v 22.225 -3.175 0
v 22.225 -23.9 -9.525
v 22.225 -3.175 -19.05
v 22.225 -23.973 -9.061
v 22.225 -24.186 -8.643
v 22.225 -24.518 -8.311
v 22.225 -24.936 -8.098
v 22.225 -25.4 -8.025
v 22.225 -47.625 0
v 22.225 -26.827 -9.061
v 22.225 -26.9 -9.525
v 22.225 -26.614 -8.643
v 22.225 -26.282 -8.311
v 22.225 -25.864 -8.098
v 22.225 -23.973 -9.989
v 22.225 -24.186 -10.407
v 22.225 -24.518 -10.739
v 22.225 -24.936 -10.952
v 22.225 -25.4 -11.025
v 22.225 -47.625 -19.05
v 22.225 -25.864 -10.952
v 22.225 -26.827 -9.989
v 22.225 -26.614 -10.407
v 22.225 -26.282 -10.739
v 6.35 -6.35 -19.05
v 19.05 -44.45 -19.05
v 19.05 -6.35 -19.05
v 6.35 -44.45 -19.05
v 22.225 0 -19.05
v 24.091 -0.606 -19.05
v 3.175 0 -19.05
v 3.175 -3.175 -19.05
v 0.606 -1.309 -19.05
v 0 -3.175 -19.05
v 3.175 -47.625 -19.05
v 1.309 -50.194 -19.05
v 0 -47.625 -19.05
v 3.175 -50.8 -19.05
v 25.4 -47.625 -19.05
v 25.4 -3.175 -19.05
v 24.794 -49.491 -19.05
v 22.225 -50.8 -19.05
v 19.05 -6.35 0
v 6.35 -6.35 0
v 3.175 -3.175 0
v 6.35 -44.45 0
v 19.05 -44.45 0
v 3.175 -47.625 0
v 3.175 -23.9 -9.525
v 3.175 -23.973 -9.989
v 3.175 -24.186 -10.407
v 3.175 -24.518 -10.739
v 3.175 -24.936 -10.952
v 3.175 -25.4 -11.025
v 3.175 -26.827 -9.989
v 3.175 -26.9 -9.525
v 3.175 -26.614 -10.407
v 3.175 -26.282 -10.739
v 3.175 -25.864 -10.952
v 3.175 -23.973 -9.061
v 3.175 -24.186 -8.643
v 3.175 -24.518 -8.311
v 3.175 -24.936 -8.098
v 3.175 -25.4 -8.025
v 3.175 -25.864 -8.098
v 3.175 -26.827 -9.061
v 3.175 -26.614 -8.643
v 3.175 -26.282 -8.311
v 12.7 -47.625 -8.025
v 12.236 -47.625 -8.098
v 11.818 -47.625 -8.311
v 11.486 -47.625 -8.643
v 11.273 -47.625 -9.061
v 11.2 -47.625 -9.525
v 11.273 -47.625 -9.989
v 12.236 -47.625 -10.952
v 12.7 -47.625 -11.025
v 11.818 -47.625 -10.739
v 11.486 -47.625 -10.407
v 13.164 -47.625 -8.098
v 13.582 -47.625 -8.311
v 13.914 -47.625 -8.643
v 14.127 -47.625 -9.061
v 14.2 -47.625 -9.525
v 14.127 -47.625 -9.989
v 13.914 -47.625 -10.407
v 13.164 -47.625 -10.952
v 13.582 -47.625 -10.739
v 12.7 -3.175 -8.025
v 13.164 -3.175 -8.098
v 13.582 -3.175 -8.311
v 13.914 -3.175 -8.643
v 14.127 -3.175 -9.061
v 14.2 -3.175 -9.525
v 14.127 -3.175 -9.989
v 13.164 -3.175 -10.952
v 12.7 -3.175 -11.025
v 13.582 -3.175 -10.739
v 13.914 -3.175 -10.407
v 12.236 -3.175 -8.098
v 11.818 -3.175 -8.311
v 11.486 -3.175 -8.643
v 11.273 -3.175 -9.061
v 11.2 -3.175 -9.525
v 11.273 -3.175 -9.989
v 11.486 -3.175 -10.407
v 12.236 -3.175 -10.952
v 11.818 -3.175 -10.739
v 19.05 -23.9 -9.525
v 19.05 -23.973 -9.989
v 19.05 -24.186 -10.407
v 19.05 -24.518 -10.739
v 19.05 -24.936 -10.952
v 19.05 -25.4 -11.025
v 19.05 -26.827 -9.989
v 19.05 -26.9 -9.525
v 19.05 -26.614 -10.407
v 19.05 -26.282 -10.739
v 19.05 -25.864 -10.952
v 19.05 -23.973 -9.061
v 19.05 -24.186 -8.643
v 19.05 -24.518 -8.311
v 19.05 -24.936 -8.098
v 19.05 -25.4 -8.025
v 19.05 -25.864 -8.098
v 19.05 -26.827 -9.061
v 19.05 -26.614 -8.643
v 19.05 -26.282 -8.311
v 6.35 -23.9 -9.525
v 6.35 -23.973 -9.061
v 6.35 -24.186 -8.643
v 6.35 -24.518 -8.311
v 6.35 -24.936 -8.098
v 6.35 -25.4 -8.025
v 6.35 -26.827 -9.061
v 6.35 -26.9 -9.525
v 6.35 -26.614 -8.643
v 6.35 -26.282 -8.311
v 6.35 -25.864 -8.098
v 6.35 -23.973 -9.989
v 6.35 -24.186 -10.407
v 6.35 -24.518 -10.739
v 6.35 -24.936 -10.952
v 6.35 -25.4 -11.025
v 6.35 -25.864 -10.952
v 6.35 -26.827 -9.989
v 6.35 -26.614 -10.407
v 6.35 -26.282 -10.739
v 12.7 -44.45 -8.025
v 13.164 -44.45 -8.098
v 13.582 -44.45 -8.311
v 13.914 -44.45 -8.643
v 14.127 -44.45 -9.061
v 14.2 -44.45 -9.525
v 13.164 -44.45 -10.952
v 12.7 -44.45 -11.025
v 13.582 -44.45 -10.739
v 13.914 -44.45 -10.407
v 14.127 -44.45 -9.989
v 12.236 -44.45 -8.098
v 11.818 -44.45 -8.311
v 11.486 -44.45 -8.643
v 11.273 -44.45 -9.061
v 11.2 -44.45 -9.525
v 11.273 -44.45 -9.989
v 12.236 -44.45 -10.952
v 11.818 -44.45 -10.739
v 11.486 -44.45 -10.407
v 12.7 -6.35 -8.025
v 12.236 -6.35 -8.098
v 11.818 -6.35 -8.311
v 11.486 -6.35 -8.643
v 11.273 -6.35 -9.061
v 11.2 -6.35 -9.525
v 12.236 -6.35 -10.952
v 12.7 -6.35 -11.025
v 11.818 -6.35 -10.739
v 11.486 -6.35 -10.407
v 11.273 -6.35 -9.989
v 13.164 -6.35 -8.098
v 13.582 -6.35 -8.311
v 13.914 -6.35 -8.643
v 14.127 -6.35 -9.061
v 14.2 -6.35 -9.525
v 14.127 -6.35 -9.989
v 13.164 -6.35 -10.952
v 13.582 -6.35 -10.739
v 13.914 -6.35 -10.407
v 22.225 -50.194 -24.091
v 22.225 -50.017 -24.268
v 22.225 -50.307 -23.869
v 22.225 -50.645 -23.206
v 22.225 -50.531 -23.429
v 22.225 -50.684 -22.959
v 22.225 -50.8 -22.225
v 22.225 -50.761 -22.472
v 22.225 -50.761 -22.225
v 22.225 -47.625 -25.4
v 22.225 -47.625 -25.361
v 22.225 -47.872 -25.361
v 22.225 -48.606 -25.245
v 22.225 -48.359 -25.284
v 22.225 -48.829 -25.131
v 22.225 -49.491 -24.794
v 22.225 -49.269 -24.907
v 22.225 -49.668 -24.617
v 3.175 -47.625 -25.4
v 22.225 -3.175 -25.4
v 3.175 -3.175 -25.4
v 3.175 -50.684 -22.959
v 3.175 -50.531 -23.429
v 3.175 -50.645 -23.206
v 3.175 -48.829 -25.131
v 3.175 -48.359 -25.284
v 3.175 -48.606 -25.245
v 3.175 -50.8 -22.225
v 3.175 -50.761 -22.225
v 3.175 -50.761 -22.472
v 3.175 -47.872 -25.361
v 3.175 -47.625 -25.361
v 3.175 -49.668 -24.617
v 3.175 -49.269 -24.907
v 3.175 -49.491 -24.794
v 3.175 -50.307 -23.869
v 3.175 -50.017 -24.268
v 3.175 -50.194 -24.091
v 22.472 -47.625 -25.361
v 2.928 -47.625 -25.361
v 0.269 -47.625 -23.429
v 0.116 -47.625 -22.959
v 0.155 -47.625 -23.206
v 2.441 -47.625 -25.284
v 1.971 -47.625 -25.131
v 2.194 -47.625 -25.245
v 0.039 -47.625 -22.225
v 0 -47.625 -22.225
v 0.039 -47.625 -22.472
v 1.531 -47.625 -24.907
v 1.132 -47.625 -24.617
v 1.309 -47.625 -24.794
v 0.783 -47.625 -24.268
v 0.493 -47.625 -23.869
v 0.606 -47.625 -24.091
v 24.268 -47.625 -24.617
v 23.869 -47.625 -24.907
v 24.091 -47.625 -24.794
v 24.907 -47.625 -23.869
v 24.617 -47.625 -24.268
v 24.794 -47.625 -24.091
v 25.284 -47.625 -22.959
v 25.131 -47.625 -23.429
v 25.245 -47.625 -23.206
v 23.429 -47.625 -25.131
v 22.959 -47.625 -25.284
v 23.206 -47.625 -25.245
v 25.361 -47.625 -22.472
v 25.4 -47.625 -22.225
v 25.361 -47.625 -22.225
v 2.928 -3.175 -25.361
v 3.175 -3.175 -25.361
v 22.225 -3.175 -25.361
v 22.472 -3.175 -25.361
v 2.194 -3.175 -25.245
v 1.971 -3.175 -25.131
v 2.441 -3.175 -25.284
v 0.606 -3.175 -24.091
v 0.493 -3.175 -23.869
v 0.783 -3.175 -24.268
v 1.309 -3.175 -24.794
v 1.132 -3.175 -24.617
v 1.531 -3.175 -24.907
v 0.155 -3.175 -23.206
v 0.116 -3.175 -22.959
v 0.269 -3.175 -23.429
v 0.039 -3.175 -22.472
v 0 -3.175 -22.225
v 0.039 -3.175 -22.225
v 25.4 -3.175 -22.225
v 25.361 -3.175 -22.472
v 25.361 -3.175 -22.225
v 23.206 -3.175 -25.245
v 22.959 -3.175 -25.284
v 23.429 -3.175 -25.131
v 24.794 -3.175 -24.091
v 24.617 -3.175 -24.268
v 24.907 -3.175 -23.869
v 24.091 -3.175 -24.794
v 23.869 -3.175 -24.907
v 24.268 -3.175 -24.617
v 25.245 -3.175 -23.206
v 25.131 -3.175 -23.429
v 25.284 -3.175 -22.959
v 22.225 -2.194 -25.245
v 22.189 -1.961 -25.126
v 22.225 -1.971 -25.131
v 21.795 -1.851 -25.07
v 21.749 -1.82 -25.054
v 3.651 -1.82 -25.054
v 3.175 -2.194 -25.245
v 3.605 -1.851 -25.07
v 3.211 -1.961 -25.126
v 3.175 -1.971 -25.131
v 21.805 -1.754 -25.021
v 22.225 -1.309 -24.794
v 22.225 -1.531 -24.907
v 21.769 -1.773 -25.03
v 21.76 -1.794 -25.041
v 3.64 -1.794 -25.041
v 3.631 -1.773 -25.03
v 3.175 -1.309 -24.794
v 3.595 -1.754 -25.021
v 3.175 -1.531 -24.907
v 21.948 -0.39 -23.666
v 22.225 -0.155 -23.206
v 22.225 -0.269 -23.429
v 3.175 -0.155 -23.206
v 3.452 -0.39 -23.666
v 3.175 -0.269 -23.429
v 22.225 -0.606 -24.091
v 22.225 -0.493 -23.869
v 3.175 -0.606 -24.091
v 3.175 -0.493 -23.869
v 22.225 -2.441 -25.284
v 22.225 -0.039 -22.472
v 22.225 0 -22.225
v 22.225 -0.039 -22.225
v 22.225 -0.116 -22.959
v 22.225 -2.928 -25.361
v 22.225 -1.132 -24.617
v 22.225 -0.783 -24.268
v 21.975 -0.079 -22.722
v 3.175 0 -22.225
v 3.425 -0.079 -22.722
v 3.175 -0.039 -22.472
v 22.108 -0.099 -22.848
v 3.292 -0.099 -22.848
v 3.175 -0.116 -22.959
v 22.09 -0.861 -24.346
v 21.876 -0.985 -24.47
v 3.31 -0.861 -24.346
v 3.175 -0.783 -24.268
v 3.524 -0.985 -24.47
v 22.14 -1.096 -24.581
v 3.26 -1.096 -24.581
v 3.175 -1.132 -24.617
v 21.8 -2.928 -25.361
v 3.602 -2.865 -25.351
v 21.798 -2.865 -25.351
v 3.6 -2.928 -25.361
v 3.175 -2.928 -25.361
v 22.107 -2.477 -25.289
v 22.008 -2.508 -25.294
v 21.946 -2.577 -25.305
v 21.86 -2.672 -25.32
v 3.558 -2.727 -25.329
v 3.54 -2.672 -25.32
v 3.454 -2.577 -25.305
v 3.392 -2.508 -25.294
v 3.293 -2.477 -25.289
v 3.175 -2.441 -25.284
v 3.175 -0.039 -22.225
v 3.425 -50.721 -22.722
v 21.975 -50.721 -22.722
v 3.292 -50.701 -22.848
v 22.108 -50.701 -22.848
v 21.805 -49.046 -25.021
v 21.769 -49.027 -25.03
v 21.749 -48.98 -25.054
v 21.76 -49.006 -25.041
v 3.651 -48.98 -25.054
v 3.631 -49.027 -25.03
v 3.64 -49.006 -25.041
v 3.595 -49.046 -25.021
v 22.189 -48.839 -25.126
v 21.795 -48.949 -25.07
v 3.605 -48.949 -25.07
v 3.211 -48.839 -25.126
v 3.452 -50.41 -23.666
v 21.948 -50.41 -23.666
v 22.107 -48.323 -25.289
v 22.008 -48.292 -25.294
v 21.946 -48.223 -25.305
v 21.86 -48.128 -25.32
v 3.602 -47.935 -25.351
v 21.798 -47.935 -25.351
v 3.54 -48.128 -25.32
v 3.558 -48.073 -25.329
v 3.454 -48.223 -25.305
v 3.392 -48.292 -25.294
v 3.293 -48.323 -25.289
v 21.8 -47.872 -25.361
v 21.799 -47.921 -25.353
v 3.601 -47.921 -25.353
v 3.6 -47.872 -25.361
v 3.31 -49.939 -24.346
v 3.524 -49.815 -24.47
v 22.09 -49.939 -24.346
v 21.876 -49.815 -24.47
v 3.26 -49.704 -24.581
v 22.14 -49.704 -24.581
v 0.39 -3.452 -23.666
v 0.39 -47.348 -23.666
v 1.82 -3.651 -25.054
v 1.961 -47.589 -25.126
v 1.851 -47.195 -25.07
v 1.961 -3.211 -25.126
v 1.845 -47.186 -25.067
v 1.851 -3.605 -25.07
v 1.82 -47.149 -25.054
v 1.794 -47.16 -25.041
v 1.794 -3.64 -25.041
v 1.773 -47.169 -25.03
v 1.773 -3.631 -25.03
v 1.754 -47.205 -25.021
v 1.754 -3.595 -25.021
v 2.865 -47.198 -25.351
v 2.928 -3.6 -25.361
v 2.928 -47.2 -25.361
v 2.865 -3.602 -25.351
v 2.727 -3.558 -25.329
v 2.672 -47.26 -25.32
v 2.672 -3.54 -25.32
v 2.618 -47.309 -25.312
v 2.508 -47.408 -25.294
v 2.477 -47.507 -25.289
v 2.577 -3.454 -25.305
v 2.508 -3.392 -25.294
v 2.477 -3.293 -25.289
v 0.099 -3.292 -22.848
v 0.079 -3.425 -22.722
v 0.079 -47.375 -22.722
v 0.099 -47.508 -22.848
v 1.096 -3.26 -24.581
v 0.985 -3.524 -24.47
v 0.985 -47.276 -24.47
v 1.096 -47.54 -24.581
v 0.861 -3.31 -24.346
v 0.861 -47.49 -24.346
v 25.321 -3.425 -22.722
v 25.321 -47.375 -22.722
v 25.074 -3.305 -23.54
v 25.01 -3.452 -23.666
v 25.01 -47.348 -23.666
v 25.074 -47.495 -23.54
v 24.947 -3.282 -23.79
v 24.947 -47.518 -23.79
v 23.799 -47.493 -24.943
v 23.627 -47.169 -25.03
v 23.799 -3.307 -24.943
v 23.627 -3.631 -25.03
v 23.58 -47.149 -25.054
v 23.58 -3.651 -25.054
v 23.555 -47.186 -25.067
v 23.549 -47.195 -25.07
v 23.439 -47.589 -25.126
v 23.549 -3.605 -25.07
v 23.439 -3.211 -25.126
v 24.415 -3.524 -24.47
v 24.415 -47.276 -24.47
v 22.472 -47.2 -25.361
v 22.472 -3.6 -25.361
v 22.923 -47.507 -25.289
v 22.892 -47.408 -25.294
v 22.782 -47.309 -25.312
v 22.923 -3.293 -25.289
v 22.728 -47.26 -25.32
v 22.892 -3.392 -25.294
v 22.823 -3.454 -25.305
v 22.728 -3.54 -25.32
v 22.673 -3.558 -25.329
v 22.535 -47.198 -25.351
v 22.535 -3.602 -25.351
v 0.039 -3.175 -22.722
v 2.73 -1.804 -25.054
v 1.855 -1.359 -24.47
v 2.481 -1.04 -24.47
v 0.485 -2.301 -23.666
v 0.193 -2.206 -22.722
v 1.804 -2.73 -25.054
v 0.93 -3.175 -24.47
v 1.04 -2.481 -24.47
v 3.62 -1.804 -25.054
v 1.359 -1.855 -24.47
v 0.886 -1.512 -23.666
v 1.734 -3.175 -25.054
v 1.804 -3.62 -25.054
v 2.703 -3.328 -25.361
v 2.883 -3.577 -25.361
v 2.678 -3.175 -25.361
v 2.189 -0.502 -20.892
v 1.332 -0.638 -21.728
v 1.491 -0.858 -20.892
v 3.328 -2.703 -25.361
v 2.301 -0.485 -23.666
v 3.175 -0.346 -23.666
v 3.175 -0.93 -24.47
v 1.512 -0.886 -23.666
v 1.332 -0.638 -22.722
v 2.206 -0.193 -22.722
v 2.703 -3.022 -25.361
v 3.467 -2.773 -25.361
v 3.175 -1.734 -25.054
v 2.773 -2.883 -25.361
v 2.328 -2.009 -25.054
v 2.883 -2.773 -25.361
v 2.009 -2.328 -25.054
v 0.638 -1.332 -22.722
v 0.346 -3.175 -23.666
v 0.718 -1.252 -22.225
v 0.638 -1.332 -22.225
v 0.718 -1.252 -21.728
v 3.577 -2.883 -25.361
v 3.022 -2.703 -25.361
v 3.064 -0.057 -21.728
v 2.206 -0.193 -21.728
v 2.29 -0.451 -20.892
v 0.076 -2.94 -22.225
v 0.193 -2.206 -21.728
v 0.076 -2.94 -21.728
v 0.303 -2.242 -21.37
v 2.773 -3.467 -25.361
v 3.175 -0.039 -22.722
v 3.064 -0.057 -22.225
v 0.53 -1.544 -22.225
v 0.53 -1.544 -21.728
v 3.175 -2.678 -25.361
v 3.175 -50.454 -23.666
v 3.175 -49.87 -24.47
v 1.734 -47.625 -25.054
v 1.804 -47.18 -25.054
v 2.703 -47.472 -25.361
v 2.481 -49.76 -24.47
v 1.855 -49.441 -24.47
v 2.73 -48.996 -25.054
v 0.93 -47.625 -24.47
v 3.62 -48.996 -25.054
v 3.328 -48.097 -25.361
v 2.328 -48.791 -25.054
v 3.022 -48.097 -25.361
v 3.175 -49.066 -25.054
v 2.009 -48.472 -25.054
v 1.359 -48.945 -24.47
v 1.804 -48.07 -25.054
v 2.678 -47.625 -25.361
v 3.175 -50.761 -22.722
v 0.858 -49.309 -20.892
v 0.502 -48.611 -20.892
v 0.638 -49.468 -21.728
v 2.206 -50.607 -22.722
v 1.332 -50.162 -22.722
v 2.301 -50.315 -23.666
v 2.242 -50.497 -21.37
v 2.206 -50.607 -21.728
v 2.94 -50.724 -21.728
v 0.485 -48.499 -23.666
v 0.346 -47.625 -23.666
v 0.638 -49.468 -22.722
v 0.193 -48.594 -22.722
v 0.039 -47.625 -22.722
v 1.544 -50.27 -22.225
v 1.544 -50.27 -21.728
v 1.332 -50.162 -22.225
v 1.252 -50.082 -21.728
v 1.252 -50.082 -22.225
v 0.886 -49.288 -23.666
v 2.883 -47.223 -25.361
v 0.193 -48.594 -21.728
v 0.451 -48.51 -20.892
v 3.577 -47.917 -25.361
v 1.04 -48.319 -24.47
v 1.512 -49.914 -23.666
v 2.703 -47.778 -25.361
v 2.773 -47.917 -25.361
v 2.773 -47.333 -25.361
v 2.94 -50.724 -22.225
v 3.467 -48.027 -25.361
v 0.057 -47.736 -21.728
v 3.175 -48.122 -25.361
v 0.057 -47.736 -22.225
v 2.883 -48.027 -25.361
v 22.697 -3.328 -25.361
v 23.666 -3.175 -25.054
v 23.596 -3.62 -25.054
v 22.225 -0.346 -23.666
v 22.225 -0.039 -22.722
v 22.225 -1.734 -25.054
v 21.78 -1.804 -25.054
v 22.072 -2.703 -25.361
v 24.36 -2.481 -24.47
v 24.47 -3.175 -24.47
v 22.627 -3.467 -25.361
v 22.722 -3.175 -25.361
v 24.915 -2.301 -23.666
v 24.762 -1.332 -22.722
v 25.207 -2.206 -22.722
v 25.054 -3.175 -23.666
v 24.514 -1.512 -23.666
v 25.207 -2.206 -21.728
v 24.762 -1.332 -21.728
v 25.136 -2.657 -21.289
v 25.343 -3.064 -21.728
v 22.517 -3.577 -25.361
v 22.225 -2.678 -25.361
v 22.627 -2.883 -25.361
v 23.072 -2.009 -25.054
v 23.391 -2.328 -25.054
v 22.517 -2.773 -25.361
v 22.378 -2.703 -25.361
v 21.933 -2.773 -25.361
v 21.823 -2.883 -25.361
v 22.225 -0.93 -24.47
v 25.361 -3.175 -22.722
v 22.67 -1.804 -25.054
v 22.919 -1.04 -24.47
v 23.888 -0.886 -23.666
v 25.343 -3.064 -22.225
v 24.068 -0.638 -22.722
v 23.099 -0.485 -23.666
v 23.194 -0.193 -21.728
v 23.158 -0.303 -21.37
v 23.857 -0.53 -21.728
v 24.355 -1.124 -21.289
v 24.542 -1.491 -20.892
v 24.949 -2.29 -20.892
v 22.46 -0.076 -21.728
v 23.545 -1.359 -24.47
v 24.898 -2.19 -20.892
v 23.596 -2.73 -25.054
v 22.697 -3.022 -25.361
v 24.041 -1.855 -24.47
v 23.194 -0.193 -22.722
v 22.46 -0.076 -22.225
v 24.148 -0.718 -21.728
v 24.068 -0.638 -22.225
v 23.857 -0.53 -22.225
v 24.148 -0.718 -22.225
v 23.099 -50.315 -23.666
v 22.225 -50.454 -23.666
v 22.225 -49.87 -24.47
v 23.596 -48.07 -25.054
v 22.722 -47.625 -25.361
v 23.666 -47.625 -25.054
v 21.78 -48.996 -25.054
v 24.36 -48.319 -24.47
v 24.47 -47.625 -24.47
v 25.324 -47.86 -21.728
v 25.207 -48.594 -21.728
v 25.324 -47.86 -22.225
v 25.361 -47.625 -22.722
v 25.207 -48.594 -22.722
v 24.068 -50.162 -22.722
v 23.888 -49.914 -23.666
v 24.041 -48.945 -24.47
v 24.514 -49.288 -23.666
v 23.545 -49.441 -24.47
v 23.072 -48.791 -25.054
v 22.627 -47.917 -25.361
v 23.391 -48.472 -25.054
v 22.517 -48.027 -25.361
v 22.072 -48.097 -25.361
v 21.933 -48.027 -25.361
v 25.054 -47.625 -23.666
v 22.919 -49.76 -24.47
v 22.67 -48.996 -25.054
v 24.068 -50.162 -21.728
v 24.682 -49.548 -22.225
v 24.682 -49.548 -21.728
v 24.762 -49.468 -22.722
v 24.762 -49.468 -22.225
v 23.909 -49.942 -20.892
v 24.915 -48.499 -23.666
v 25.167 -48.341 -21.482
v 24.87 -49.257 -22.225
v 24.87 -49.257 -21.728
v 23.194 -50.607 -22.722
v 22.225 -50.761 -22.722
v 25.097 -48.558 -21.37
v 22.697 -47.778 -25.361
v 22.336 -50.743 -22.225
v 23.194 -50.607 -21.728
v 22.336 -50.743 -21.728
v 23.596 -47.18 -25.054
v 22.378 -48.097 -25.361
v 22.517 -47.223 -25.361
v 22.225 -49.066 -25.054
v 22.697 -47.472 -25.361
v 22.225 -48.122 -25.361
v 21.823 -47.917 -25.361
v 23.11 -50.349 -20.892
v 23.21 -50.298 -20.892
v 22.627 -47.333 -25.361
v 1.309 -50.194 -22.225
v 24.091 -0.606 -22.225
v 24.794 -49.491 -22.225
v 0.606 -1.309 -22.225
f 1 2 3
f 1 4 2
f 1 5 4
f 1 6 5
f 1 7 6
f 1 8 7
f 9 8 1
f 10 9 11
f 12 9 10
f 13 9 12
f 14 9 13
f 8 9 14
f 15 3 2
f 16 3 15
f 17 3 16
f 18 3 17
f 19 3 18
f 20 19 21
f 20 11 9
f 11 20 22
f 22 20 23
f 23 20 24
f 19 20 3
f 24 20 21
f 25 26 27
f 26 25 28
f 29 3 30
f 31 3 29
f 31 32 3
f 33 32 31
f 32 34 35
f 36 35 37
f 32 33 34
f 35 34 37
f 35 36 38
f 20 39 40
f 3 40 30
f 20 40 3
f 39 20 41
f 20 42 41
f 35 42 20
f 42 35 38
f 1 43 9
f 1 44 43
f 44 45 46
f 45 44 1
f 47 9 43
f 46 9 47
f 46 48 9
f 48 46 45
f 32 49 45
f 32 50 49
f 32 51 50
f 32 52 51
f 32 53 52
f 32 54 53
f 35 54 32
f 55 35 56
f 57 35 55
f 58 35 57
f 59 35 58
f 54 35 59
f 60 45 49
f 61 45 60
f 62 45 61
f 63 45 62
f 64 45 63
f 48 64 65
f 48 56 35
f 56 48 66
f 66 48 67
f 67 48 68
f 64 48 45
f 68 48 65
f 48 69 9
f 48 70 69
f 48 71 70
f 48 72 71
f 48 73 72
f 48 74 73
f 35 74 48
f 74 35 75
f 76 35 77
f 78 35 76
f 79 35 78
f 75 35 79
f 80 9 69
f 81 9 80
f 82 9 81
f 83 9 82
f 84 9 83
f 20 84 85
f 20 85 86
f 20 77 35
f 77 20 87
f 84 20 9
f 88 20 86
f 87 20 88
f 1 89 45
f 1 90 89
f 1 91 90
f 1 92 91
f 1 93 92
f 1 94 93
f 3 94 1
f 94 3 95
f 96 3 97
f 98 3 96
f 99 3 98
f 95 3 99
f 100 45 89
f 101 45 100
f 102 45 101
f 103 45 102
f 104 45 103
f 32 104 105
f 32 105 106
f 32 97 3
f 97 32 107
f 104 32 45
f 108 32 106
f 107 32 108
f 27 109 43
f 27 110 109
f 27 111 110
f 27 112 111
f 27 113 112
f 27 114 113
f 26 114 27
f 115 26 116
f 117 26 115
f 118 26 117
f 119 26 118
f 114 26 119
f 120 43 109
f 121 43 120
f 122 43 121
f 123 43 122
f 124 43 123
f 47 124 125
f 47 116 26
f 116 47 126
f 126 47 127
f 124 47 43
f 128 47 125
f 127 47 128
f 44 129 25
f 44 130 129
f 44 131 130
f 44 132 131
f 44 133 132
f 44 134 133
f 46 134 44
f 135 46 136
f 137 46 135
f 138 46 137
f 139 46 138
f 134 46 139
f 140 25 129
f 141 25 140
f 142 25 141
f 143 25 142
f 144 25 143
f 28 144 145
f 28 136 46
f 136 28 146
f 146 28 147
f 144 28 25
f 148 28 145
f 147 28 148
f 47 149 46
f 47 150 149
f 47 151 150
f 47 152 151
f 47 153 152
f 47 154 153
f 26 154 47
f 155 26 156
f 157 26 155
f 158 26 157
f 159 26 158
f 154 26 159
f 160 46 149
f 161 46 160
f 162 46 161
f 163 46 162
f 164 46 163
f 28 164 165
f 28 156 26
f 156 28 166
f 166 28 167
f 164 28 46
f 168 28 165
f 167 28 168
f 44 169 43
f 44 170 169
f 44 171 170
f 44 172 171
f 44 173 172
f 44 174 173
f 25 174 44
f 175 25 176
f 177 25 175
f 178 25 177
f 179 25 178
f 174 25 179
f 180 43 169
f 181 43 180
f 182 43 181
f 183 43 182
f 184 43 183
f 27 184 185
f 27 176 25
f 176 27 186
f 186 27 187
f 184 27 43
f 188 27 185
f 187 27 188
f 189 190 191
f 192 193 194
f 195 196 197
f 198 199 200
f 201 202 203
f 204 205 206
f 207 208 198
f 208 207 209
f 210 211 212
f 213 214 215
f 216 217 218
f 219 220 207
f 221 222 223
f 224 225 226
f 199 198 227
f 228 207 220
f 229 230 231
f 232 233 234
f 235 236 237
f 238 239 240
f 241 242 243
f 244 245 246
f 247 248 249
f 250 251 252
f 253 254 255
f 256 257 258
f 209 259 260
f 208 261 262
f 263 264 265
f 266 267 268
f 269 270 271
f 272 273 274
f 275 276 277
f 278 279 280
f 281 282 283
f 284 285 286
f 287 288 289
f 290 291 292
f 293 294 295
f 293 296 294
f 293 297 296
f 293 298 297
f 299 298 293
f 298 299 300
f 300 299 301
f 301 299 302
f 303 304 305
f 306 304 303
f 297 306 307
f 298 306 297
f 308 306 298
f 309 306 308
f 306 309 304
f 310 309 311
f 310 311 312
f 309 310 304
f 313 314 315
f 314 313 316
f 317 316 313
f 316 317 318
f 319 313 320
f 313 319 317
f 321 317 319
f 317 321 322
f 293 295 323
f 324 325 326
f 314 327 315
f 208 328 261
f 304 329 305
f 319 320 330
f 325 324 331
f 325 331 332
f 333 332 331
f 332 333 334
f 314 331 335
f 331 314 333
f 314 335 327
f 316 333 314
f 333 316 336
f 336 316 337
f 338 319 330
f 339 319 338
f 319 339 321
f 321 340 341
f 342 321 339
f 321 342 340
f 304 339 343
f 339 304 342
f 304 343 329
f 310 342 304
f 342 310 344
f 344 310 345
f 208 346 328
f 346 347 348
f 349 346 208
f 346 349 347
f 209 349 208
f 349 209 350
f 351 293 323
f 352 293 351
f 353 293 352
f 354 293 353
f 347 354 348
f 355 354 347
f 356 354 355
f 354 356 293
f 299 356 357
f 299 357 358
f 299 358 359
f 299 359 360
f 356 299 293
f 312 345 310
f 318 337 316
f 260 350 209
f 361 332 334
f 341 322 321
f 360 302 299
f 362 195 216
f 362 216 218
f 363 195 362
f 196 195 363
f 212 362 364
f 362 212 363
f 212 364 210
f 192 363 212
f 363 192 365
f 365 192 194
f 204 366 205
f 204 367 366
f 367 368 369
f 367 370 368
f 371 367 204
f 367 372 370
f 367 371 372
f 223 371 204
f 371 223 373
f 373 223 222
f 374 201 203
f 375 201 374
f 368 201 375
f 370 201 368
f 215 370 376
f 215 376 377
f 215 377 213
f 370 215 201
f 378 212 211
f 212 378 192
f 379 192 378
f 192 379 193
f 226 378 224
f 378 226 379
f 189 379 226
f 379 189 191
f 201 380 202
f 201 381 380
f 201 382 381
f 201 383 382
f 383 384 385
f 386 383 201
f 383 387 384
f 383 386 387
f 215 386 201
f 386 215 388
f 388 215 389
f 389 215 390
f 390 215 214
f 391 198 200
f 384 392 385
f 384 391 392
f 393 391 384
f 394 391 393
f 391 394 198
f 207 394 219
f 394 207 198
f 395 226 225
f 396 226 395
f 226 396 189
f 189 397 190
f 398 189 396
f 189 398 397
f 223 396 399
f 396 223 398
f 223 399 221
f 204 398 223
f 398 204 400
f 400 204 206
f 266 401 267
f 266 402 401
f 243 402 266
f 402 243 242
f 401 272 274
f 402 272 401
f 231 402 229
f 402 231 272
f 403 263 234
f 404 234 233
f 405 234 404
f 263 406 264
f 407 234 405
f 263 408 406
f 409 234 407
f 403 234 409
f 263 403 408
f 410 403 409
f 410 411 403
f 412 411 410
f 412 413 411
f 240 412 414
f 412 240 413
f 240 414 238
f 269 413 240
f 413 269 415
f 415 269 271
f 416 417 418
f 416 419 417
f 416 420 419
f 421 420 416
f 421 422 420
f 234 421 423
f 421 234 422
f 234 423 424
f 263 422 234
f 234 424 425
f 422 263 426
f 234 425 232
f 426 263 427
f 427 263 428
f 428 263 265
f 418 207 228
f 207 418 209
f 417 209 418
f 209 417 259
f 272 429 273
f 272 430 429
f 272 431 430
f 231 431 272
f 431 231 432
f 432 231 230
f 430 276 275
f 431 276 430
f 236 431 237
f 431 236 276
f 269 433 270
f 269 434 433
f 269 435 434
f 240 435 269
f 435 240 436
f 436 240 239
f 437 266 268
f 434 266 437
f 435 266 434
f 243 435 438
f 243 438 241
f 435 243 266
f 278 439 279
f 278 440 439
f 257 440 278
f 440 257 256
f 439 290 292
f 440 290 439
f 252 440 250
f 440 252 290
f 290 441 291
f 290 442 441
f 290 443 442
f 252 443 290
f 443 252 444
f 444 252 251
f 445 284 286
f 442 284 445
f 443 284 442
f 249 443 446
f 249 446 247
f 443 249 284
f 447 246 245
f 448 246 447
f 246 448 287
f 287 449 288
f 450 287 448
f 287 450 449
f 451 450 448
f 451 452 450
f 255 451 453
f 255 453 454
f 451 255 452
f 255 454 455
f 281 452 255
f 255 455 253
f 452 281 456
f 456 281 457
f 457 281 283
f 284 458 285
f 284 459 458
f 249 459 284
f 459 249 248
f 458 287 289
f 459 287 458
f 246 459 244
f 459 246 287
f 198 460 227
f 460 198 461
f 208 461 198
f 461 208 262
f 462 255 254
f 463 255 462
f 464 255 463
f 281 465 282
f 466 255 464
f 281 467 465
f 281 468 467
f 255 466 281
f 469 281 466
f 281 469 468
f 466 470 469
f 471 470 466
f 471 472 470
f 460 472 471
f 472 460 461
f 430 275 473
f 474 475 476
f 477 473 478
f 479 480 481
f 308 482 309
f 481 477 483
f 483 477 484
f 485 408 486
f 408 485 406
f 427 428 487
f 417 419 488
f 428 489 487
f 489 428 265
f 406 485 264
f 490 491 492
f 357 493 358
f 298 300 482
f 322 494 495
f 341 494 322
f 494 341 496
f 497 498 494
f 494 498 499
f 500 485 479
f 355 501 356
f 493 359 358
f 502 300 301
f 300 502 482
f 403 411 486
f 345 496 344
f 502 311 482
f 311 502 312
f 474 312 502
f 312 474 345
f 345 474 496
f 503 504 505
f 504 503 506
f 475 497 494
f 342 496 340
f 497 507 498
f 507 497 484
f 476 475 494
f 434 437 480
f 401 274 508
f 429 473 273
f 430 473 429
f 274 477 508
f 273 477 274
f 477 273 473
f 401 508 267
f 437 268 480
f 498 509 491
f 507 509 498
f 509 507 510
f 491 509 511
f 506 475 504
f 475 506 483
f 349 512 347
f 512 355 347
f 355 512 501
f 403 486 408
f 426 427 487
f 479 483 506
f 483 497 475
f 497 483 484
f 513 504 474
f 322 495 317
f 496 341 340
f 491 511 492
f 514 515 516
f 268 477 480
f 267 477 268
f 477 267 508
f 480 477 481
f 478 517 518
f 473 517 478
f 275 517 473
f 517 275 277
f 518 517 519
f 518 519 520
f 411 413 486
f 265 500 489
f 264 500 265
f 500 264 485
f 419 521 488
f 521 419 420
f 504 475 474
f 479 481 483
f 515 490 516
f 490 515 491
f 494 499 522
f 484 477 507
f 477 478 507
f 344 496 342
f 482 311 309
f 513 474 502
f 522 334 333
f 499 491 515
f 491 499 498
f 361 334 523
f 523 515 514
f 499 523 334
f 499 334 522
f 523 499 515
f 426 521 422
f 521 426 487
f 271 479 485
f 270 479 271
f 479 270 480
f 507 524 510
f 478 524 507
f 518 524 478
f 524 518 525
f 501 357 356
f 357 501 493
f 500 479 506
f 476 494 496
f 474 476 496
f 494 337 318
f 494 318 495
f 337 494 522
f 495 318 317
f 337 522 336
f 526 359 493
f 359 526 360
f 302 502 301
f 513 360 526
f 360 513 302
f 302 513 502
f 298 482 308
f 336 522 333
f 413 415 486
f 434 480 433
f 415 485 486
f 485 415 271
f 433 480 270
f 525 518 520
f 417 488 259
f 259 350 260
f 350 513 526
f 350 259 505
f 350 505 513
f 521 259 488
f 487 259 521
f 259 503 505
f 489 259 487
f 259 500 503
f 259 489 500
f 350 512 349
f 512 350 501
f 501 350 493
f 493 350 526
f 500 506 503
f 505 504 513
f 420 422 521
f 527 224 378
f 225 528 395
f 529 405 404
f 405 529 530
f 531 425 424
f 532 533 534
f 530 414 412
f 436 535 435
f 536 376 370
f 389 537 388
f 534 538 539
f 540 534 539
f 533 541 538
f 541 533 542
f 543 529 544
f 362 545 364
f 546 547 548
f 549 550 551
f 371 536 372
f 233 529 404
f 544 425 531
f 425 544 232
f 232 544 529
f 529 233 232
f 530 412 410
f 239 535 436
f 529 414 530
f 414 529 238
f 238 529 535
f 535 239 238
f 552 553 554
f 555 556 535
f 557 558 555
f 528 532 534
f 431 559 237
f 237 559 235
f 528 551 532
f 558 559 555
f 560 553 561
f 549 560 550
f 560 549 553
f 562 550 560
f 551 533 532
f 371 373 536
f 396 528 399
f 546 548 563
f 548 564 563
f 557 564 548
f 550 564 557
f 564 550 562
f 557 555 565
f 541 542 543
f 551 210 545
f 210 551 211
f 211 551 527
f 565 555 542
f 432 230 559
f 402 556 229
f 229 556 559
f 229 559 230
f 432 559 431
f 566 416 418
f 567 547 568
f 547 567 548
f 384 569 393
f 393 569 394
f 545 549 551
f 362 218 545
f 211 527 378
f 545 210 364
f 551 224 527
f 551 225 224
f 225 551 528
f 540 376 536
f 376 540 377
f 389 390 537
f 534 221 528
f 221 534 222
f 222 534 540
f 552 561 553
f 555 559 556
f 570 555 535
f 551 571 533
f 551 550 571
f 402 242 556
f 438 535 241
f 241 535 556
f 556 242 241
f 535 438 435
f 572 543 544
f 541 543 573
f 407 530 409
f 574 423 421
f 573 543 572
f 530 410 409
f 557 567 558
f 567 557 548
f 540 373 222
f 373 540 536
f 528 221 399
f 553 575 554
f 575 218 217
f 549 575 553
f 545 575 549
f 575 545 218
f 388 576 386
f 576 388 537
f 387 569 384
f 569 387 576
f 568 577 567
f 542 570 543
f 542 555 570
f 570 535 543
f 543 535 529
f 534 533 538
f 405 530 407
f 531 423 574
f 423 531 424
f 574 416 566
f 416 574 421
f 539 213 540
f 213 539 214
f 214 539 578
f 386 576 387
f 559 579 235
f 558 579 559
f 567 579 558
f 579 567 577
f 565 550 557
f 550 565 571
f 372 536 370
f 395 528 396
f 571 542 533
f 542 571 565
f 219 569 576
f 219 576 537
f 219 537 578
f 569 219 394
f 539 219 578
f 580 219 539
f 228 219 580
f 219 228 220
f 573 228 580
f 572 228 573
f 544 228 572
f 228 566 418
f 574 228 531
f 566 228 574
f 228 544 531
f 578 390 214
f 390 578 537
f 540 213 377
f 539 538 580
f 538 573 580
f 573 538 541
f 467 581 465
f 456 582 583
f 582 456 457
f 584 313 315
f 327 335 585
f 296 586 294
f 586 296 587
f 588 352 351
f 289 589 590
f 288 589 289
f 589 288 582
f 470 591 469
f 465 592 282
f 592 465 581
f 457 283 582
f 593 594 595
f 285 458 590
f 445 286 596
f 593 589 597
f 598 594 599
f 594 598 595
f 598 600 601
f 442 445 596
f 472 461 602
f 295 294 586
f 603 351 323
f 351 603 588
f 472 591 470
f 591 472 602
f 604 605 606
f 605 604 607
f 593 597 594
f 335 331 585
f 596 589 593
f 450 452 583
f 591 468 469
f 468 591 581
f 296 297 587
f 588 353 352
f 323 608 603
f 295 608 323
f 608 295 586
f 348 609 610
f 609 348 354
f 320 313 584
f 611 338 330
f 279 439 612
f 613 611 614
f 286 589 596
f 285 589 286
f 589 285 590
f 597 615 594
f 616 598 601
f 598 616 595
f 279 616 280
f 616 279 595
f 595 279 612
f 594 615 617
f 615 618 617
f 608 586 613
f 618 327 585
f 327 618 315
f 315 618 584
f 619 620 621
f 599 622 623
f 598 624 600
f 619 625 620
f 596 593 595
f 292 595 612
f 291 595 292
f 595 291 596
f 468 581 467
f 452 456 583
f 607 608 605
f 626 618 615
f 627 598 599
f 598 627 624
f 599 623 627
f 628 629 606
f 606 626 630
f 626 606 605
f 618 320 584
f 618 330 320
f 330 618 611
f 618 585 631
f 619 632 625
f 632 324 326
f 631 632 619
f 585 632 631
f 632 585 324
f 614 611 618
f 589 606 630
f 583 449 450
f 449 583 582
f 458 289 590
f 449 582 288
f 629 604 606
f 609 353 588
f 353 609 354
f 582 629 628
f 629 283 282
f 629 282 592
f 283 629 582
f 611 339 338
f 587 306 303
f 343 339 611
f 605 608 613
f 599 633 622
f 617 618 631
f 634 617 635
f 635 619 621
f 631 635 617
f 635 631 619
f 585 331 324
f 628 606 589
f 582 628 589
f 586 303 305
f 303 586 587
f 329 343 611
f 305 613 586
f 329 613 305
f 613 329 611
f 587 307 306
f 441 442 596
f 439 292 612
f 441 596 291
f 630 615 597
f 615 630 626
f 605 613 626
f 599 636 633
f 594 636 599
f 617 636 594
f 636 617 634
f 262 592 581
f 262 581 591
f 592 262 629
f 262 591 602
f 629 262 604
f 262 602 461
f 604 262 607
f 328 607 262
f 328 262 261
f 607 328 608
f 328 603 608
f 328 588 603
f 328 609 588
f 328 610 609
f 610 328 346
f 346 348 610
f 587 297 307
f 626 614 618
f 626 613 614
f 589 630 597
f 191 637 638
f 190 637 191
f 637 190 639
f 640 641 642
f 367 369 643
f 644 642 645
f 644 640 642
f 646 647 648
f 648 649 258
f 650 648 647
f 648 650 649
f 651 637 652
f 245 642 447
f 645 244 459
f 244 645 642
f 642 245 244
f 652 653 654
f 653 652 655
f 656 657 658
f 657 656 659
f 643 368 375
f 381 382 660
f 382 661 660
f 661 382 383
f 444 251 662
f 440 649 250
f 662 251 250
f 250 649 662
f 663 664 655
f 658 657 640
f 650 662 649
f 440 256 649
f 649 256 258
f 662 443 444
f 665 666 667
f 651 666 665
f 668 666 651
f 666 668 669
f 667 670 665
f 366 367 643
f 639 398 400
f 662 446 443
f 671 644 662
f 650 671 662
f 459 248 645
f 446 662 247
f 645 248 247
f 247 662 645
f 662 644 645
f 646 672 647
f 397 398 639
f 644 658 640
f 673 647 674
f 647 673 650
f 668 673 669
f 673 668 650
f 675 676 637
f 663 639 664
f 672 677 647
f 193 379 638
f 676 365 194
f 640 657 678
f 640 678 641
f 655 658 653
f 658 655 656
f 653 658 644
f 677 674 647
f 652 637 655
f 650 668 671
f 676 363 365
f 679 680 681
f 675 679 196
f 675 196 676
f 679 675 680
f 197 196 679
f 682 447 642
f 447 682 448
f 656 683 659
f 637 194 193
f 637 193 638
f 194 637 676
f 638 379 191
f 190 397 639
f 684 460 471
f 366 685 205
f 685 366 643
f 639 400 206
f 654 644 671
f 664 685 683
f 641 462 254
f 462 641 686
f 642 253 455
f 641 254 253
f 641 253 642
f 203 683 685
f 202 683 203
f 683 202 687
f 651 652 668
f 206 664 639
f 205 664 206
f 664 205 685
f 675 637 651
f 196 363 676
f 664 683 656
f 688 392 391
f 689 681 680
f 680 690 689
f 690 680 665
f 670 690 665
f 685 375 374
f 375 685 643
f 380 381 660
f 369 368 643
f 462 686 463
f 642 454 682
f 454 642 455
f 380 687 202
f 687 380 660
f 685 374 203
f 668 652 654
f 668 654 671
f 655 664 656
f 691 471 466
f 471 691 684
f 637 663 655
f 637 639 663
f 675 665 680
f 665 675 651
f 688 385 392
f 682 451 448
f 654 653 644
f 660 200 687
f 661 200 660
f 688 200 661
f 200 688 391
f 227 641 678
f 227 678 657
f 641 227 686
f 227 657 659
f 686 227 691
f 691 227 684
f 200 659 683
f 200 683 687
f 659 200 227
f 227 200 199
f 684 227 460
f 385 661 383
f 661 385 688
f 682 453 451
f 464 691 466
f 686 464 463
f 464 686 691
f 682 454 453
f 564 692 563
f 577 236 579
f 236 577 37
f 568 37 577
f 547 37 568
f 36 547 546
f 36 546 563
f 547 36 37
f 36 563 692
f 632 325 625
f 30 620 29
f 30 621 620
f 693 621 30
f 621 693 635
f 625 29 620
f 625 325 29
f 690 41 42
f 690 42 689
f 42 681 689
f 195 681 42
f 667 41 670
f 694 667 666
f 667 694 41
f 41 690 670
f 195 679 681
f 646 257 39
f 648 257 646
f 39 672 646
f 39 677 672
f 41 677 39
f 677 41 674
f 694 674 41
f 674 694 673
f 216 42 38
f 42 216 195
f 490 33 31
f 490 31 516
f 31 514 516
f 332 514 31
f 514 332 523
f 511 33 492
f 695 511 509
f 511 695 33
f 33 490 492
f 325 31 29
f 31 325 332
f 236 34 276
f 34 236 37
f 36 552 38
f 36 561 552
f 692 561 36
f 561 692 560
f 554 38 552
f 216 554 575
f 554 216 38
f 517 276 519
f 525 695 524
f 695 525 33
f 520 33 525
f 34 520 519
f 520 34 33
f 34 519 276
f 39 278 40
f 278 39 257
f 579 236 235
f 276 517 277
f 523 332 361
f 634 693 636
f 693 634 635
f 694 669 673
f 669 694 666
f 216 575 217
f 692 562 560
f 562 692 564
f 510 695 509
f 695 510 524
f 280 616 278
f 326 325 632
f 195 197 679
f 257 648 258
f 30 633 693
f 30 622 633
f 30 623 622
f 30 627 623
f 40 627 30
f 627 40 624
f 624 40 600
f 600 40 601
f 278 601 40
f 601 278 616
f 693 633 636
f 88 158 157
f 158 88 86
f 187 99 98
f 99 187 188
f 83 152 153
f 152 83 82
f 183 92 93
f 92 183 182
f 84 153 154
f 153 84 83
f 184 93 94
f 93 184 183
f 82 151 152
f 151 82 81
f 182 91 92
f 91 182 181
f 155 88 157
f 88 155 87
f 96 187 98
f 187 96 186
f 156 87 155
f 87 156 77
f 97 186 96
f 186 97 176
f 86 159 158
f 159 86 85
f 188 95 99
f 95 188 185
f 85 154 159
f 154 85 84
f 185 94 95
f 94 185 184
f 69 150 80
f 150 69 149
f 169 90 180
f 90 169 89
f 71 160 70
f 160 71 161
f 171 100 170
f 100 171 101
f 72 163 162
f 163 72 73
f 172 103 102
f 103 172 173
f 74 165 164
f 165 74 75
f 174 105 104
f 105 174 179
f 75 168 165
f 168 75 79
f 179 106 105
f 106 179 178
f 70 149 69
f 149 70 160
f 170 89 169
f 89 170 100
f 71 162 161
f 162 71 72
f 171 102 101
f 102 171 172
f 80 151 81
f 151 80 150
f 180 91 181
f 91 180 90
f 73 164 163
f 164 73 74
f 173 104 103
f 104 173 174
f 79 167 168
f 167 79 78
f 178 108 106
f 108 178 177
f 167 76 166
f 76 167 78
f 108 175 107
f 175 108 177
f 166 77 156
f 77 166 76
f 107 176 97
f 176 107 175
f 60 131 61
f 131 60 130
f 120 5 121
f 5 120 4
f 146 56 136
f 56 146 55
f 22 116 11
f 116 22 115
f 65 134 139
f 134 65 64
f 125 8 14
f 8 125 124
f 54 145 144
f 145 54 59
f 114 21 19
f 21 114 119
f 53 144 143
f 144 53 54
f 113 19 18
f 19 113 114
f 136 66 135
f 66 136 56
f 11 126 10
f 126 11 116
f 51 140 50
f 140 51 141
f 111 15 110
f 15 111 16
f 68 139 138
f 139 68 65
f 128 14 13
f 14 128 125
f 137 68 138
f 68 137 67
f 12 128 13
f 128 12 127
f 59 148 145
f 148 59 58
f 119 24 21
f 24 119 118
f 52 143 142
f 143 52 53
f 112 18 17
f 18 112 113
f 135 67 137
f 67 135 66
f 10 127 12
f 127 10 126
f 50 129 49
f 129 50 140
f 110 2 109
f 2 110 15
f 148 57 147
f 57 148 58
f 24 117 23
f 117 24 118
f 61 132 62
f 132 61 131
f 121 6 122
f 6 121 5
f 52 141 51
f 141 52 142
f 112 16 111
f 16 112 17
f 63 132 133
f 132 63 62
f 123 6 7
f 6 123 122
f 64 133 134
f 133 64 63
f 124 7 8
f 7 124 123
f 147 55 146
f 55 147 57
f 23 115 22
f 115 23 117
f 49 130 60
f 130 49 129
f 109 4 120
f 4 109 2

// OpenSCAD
in=25.4;

module roundedRect(size, radius) {
x = size[0];
y = size[1];
z = size[2];

linear_extrude(height=z)
	hull() {
		// place 4 circles in the corners, with the given radius
		translate([(-x/2)+(radius/2), (-y/2)+(radius/2), 0])
		circle(r=radius);
	
		translate([(x/2)-(radius/2), (-y/2)+(radius/2), 0])
		circle(r=radius);
	
		translate([(-x/2)+(radius/2), (y/2)-(radius/2), 0])
		circle(r=radius);
	
		translate([(x/2)-(radius/2), (y/2)-(radius/2), 0])
		circle(r=radius);
	}
}


module rounded_cube(sx,sy,sz,r) 
{
	$fn=20;
	union()
	{
		translate([r,r,0]) cube([sx-2*r,sy-2*r,sz],false);
		translate([r,0,r]) cube([sx-2*r,sy,sz-2*r],false);
		translate([0,r,r]) cube([sx,sy-2*r,sz-2*r],false);

		translate([r,r,r]) rotate(a=[0,90,0]) cylinder(h=sx-2*r,r=r,center=false);
		translate([r,sy-r,r]) rotate(a=[0,90,0]) cylinder(h=sx-2*r,r=r,center=false);
		translate([r,r,sz-r]) rotate(a=[0,90,0]) cylinder(h=sx-2*r,r=r,center=false);
		translate([r,sy-r,sz-r]) rotate(a=[0,90,0]) cylinder(h=sx-2*r,r=r,center=false);

		translate([r,r,r]) rotate(a=[0,0,0]) cylinder(h=sz-2*r,r=r,center=false);
		translate([r,sy-r,r]) rotate(a=[0,0,0]) cylinder(h=sz-2*r,r=r,center=false);
		translate([sx-r,r,r]) rotate(a=[0,0,0]) cylinder(h=sz-2*r,r=r,center=false);
		translate([sx-r,sy-r,r]) rotate(a=[0,0,0]) cylinder(h=sz-2*r,r=r,center=false);

		translate([r,r,r]) rotate(a=[-90,0,0]) cylinder(h=sy-2*r,r=r,center=false);
		translate([r,r,sz-r]) rotate(a=[-90,0,0]) cylinder(h=sy-2*r,r=r,center=false);
		translate([sx-r,r,r]) rotate(a=[-90,0,0]) cylinder(h=sy-2*r,r=r,center=false);
		translate([sx-r,r,sz-r]) rotate(a=[-90,0,0]) cylinder(h=sy-2*r,r=r,center=false);

		translate([r,r,r]) sphere(r);
		translate([r,sy-r,r]) sphere(r);
		translate([r,r,sz-r]) sphere(r);
		translate([r,sy-r,sz-r]) sphere(r);

		translate([sx-r,r,r]) sphere(r);
		translate([sx-r,sy-r,r]) sphere(r);
		translate([sx-r,r,sz-r]) sphere(r);
		translate([sx-r,sy-r,sz-r]) sphere(r);
	}
}



module endCap(w=1*in, l=1*in, ih=in/2, wall=in/16, oh=in/4) {
	offset=wall;
	hole=3;		//mount hole diameter

	rotate([180, 0,0])
		difference() {
			union() {
				difference() {
					translate([wall,wall,0]) cube([w-wall*2,l-wall*2,ih]);
				#	translate([wall*2,wall*2,0]) cube([w-wall*4,l-wall*4,ih]);
				}
				#translate([offset,offset,ih]) linear_extrude(height=oh/2) {
						offset(offset) square([w-offset*2,l-offset*2], $fn=20);
				}
				translate([0,0,ih]) rounded_cube(w,l,oh, offset);
			}
		
		holeDepth = ih-min(0.5*in, ih/2);
			echo(holeDepth=holeDepth);
		translate([w/2, 0, holeDepth]) rotate([-90, 0, 0]) cylinder(d=hole, h=l, $fn=20);
		translate([0, l/2, holeDepth]) rotate([0, 90, 0]) cylinder(d=hole, h=w, $fn=20);
		
		}
}



*endCap(1*in, 1*in, 0.75*in, in/16, in/4);	// 1x1x1/16 tubing, 1/2" insert, 1/4" exterior
*endCap(1*in, 1*in, in/2, in/8, in/4);	// 1x1x1/8 tubing, 1/2" insert, 1/4" exterior
*endCap(1*in, 2*in, in/2, in/16, in/4);	// 1x2x1/16 tubing, 1/2" insert, 1/4" exterior
endCap(1*in, 2*in, 0.75*in, in/8, in/4);	// 1x2x1/8 tubing, 1/2" insert, 1/4" exterior
